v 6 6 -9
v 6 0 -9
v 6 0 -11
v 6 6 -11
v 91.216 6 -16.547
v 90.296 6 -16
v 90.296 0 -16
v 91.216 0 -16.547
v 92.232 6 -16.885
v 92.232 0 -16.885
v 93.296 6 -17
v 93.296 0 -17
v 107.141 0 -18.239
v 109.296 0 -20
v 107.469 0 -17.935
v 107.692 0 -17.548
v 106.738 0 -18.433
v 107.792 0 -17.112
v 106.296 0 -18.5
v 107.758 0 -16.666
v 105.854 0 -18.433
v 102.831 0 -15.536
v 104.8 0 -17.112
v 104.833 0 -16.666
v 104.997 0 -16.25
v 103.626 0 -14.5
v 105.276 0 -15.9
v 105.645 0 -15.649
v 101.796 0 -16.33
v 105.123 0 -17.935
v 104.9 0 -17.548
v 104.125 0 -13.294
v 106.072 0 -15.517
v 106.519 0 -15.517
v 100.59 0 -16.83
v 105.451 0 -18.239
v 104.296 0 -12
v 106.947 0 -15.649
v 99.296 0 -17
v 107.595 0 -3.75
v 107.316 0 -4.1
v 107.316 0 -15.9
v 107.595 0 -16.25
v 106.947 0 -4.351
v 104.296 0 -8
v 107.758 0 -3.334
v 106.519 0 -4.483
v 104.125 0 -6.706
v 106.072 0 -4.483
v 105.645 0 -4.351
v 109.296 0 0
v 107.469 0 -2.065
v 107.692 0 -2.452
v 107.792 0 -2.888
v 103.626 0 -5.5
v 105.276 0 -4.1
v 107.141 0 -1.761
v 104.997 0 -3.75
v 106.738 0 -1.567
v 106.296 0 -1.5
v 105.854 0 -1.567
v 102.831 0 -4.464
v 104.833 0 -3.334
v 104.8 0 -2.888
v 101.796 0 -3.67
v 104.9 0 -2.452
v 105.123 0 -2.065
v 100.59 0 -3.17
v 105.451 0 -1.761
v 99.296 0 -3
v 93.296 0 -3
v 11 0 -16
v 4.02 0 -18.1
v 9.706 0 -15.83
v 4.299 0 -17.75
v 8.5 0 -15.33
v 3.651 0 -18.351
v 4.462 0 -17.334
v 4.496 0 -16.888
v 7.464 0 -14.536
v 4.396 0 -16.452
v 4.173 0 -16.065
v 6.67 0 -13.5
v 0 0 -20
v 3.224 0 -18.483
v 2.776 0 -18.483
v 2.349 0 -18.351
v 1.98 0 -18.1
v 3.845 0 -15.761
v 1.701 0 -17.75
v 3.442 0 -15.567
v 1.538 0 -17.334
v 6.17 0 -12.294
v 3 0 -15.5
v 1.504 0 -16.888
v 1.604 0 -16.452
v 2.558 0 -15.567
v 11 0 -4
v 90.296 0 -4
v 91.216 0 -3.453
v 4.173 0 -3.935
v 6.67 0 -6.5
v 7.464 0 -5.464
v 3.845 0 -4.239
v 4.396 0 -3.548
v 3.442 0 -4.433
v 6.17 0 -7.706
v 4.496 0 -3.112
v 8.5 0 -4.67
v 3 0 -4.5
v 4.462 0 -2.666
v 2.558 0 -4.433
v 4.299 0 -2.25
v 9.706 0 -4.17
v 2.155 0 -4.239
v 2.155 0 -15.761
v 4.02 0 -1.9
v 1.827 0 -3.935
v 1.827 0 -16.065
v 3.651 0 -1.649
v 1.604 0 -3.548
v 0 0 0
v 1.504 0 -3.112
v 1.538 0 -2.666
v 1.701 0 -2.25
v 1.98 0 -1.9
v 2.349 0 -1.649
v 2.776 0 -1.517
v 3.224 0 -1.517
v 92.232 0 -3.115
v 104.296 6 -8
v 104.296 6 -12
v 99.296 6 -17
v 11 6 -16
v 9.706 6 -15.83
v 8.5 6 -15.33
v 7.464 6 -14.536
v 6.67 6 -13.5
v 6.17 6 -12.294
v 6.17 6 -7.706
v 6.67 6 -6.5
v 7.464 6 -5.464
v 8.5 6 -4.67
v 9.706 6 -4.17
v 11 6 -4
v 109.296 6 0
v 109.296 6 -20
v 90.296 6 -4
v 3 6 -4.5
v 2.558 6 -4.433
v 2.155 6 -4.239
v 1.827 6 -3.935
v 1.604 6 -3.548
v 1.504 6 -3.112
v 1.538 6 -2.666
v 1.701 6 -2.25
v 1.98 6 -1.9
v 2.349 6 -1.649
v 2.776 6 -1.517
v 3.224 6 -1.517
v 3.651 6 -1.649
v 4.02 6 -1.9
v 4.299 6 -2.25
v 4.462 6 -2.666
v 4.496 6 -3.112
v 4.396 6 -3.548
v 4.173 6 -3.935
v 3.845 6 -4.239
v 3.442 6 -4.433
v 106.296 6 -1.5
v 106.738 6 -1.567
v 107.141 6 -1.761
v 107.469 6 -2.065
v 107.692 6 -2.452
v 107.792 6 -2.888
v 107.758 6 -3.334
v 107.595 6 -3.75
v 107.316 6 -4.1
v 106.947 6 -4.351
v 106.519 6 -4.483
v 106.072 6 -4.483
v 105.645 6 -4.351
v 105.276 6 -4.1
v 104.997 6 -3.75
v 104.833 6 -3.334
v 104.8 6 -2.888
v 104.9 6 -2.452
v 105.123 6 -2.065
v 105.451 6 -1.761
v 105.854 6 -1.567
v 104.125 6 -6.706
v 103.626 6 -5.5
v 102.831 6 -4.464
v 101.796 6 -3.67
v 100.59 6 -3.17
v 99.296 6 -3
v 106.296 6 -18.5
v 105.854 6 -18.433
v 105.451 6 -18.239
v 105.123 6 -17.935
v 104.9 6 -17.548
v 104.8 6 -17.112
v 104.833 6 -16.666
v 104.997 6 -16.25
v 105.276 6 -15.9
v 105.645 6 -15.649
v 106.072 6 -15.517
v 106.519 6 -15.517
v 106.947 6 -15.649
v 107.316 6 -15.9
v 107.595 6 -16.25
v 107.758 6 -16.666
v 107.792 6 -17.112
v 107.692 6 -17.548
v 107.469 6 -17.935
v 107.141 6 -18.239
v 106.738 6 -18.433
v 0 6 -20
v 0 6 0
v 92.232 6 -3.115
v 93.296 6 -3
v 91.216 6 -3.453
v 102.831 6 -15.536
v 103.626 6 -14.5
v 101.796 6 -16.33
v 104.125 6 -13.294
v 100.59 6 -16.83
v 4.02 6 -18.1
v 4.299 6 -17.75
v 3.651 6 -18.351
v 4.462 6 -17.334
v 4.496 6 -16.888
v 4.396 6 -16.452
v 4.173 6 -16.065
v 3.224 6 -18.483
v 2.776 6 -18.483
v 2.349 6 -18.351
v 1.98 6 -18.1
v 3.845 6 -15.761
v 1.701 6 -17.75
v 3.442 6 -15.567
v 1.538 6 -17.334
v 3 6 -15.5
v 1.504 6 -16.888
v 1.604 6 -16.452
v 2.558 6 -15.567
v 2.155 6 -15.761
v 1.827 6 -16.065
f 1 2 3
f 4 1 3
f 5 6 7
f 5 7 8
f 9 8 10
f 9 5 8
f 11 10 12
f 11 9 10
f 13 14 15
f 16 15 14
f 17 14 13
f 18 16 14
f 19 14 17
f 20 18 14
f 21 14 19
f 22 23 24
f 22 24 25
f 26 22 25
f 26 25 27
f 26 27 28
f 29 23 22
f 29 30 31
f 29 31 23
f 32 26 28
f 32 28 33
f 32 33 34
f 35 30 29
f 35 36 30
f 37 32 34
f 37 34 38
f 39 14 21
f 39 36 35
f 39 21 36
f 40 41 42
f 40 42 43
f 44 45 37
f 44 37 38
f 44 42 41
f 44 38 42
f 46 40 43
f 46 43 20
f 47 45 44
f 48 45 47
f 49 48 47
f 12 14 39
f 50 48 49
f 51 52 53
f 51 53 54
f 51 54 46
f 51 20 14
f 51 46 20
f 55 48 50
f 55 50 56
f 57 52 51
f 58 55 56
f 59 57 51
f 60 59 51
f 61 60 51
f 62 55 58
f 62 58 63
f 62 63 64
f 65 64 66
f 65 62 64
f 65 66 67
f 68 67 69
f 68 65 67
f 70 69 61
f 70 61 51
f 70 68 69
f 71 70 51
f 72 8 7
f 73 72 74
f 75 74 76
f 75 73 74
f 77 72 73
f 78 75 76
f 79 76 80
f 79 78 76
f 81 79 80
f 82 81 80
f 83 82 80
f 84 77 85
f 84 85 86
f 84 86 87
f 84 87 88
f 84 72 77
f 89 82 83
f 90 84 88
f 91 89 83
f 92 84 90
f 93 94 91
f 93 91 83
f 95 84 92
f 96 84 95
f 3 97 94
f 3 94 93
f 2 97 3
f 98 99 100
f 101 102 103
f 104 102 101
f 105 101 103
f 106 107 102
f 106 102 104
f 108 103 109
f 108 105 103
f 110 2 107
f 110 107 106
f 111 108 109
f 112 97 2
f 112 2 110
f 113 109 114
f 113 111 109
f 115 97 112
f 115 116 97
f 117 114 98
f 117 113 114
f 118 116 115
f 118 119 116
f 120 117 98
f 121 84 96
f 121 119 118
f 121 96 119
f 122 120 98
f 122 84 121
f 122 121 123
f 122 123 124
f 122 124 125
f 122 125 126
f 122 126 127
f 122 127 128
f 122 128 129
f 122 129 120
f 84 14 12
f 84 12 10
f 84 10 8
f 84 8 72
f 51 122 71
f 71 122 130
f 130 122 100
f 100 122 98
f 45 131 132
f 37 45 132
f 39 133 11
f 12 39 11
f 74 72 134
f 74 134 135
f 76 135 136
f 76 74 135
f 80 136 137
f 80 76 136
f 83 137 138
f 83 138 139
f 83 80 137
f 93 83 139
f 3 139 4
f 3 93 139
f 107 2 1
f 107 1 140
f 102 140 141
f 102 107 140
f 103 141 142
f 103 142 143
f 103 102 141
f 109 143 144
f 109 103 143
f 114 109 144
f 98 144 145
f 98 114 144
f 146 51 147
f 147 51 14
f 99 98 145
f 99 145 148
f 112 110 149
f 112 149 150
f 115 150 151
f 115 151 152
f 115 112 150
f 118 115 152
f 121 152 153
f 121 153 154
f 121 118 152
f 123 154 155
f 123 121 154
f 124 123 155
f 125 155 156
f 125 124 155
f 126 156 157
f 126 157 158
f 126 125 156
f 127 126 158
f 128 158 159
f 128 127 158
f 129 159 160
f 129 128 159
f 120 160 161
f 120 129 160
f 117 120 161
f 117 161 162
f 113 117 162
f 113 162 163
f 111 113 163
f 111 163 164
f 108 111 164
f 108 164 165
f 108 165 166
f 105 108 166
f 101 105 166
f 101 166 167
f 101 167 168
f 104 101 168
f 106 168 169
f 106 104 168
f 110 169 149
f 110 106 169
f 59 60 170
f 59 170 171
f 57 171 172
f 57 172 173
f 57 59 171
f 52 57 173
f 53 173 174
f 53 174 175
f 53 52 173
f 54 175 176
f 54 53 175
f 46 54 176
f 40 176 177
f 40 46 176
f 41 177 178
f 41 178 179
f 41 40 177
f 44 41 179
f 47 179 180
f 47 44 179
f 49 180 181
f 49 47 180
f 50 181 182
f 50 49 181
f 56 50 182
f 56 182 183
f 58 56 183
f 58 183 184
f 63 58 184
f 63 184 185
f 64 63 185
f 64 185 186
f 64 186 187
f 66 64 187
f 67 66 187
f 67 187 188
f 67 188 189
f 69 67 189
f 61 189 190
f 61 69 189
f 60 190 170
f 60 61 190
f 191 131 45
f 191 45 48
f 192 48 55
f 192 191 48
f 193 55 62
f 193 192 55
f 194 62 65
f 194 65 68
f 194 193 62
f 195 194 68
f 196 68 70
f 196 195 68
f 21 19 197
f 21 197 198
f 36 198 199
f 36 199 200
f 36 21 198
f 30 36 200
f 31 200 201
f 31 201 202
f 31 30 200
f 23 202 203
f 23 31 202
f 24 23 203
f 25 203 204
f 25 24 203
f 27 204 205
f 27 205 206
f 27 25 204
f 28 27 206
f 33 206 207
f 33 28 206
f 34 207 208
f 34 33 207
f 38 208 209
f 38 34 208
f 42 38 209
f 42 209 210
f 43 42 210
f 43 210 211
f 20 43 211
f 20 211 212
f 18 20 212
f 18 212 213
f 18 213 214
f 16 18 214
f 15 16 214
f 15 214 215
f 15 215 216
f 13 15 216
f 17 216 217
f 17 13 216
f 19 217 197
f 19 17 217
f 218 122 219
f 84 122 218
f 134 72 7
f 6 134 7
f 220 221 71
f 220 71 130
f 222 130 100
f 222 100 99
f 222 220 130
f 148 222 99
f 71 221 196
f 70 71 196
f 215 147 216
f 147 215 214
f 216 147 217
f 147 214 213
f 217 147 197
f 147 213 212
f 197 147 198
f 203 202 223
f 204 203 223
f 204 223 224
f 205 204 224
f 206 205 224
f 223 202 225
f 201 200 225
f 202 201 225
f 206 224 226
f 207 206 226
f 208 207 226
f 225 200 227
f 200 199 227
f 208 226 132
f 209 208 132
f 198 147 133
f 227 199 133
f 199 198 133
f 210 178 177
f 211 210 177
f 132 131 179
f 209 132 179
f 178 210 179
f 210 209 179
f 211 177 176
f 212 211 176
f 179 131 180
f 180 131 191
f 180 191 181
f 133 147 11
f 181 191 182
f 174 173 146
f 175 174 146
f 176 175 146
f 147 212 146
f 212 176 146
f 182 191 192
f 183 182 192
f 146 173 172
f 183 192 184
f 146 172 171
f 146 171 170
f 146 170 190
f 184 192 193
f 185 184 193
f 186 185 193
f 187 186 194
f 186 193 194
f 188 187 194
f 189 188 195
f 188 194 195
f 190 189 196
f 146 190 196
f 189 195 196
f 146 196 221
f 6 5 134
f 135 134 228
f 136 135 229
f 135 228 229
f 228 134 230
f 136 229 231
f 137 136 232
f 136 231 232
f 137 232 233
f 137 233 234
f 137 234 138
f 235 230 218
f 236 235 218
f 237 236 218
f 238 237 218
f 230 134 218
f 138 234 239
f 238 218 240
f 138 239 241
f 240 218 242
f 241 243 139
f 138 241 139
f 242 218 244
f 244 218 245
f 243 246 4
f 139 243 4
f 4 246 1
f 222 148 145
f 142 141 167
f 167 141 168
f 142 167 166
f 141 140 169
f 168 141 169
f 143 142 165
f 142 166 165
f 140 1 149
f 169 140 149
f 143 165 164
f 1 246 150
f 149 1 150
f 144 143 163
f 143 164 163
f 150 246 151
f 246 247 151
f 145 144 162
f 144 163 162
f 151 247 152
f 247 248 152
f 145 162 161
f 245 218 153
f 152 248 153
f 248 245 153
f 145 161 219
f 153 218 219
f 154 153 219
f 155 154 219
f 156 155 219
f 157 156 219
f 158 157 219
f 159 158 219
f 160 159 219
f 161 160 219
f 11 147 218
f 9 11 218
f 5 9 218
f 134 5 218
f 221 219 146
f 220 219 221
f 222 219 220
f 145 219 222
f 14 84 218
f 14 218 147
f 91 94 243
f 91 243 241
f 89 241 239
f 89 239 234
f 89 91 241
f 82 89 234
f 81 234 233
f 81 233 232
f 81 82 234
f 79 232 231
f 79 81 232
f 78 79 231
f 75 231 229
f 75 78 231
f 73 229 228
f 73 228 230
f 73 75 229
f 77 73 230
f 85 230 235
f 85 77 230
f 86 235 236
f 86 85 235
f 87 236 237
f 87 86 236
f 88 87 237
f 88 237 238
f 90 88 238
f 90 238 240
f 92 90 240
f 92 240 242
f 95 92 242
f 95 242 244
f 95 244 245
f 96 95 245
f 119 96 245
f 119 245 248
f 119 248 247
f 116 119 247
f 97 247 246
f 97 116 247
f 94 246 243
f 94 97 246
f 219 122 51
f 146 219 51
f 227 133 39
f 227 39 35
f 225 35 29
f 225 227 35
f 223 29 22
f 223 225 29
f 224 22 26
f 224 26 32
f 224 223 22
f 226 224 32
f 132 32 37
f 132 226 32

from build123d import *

# Parameters (mm, degrees)
SKETCH1_W           = 109.295835398
SKETCH1_H           = 20
SKETCH1_R           = 1.5
SKETCH1_W_2         = 97.295835398
SKETCH1_H_2         = 12
BOSS_EXTRUDE1_DEPTH = 6
CUT_EXTRUDE1_DEPTH  = 112.272546639
FILLET1_R           = 5


with BuildPart() as part:
    # Sketch1 → Boss-Extrude1 (new body)
    with BuildSketch(Plane(origin=(0, 0, 0), x_dir=(1, 0, 0), z_dir=(0, 1, 0))):
        with Locations((54.647917699, 10)):
            Rectangle(SKETCH1_W, SKETCH1_H)
        with Locations(Location((3, 17, 0), (0, 0, 270))):
            Circle(SKETCH1_R, mode=Mode.SUBTRACT)
        with Locations(Location((3, 3, 0), (0, 0, 90))):
            Circle(SKETCH1_R, mode=Mode.SUBTRACT)
        with Locations(Location((106.295835398, 3, 0), (0, 0, 270))):
            Circle(SKETCH1_R, mode=Mode.SUBTRACT)
        with Locations(Location((106.295835398, 17, 0), (0, 0, 90))):
            Circle(SKETCH1_R, mode=Mode.SUBTRACT)
        with Locations((54.647917699, 10)):
            Rectangle(SKETCH1_W_2, SKETCH1_H_2, mode=Mode.SUBTRACT)
    extrude(amount=BOSS_EXTRUDE1_DEPTH)

    # Sketch2 → Cut-Extrude1 (cut, through all)
    with BuildSketch(Plane(origin=(0, 6, 0), x_dir=(1, 0, 0), z_dir=(0, 1, 0))):
        Polygon((90.295835398, 17), (90.295835398, 16), (103.295835398, 16), (103.295835398, 4), (90.295835398, 4), (90.295835398, 3), (104.295835398, 3), (104.295835398, 17), align=None)
    extrude(amount=-CUT_EXTRUDE1_DEPTH, mode=Mode.SUBTRACT)

    # Fillet1
    # the kernel refuses this fillet: 5 mm, written as the material it adds along each edge
    with BuildSketch(Plane(origin=(104.295835398, 6, -17), x_dir=(0, 0, 1), z_dir=(0, -1, 0)), Plane(origin=(104.295835398, 6, -3), x_dir=(-1, 0, 0), z_dir=(0, -1, 0)), Plane(origin=(6, 0, -16), x_dir=(0, 0, 1), z_dir=(0, 1, 0))) as fillet1_piece_1:
        with BuildLine():
            CenterArc((FILLET1_R, FILLET1_R), FILLET1_R, 180, 90)
            Line((0, FILLET1_R), (-FILLET1_R * 0.02, FILLET1_R))
            Line((-FILLET1_R * 0.02, FILLET1_R), (-FILLET1_R * 0.02, -FILLET1_R * 0.02))
            Line((-FILLET1_R * 0.02, -FILLET1_R * 0.02), (FILLET1_R, -FILLET1_R * 0.02))
            Line((FILLET1_R, -FILLET1_R * 0.02), (FILLET1_R, 0))
        make_face()
    extrude(amount=6)
    with BuildSketch(Plane(origin=(90.295835398, 6, -17), x_dir=(1, 0, 0), z_dir=(0, -1, 0))) as fillet1_piece_2:
        with BuildLine():
            CenterArc((3, 5), FILLET1_R, 233.130102354, 36.869897646)
            Line((0, 1), (-0.06, 0.92))
            ThreePointArc((-0.06, 0.92), (-0.1, 0.5), (-0.1, 0))
            Line((-0.1, 0), (0, -0.1))
            Line((0, -0.1), (3, -0.1))
            Line((3, -0.1), (3, 0))
        make_face()
    extrude(amount=6)
    with BuildSketch(Plane(origin=(90.295835398, 6, -3), x_dir=(0, 0, -1), z_dir=(0, -1, 0))) as fillet1_piece_3:
        with BuildLine():
            CenterArc((5, 3), FILLET1_R, 180, 36.869897646)
            Line((0, 3), (-0.1, 3))
            Line((-0.1, 3), (-0.1, 0))
            Line((-0.1, 0), (0, -0.1))
            ThreePointArc((0, -0.1), (0.5, -0.1), (0.92, -0.06))
            Line((0.92, -0.06), (1, 0))
        make_face()
    extrude(amount=6)
    with BuildSketch(Plane(origin=(6, 0, -4), x_dir=(0, 0, -1), z_dir=(0, 1, 0))) as fillet1_piece_4:
        with BuildLine():
            CenterArc((FILLET1_R, -FILLET1_R), FILLET1_R, 90, 90)
            Line((0, -FILLET1_R), (-FILLET1_R * 0.02, -FILLET1_R))
            Line((-FILLET1_R * 0.02, -FILLET1_R), (-FILLET1_R * 0.02, FILLET1_R * 0.02))
            Line((-FILLET1_R * 0.02, FILLET1_R * 0.02), (FILLET1_R, FILLET1_R * 0.02))
            Line((FILLET1_R, FILLET1_R * 0.02), (FILLET1_R, 0))
        make_face()
    extrude(amount=6)


solid = part.part
